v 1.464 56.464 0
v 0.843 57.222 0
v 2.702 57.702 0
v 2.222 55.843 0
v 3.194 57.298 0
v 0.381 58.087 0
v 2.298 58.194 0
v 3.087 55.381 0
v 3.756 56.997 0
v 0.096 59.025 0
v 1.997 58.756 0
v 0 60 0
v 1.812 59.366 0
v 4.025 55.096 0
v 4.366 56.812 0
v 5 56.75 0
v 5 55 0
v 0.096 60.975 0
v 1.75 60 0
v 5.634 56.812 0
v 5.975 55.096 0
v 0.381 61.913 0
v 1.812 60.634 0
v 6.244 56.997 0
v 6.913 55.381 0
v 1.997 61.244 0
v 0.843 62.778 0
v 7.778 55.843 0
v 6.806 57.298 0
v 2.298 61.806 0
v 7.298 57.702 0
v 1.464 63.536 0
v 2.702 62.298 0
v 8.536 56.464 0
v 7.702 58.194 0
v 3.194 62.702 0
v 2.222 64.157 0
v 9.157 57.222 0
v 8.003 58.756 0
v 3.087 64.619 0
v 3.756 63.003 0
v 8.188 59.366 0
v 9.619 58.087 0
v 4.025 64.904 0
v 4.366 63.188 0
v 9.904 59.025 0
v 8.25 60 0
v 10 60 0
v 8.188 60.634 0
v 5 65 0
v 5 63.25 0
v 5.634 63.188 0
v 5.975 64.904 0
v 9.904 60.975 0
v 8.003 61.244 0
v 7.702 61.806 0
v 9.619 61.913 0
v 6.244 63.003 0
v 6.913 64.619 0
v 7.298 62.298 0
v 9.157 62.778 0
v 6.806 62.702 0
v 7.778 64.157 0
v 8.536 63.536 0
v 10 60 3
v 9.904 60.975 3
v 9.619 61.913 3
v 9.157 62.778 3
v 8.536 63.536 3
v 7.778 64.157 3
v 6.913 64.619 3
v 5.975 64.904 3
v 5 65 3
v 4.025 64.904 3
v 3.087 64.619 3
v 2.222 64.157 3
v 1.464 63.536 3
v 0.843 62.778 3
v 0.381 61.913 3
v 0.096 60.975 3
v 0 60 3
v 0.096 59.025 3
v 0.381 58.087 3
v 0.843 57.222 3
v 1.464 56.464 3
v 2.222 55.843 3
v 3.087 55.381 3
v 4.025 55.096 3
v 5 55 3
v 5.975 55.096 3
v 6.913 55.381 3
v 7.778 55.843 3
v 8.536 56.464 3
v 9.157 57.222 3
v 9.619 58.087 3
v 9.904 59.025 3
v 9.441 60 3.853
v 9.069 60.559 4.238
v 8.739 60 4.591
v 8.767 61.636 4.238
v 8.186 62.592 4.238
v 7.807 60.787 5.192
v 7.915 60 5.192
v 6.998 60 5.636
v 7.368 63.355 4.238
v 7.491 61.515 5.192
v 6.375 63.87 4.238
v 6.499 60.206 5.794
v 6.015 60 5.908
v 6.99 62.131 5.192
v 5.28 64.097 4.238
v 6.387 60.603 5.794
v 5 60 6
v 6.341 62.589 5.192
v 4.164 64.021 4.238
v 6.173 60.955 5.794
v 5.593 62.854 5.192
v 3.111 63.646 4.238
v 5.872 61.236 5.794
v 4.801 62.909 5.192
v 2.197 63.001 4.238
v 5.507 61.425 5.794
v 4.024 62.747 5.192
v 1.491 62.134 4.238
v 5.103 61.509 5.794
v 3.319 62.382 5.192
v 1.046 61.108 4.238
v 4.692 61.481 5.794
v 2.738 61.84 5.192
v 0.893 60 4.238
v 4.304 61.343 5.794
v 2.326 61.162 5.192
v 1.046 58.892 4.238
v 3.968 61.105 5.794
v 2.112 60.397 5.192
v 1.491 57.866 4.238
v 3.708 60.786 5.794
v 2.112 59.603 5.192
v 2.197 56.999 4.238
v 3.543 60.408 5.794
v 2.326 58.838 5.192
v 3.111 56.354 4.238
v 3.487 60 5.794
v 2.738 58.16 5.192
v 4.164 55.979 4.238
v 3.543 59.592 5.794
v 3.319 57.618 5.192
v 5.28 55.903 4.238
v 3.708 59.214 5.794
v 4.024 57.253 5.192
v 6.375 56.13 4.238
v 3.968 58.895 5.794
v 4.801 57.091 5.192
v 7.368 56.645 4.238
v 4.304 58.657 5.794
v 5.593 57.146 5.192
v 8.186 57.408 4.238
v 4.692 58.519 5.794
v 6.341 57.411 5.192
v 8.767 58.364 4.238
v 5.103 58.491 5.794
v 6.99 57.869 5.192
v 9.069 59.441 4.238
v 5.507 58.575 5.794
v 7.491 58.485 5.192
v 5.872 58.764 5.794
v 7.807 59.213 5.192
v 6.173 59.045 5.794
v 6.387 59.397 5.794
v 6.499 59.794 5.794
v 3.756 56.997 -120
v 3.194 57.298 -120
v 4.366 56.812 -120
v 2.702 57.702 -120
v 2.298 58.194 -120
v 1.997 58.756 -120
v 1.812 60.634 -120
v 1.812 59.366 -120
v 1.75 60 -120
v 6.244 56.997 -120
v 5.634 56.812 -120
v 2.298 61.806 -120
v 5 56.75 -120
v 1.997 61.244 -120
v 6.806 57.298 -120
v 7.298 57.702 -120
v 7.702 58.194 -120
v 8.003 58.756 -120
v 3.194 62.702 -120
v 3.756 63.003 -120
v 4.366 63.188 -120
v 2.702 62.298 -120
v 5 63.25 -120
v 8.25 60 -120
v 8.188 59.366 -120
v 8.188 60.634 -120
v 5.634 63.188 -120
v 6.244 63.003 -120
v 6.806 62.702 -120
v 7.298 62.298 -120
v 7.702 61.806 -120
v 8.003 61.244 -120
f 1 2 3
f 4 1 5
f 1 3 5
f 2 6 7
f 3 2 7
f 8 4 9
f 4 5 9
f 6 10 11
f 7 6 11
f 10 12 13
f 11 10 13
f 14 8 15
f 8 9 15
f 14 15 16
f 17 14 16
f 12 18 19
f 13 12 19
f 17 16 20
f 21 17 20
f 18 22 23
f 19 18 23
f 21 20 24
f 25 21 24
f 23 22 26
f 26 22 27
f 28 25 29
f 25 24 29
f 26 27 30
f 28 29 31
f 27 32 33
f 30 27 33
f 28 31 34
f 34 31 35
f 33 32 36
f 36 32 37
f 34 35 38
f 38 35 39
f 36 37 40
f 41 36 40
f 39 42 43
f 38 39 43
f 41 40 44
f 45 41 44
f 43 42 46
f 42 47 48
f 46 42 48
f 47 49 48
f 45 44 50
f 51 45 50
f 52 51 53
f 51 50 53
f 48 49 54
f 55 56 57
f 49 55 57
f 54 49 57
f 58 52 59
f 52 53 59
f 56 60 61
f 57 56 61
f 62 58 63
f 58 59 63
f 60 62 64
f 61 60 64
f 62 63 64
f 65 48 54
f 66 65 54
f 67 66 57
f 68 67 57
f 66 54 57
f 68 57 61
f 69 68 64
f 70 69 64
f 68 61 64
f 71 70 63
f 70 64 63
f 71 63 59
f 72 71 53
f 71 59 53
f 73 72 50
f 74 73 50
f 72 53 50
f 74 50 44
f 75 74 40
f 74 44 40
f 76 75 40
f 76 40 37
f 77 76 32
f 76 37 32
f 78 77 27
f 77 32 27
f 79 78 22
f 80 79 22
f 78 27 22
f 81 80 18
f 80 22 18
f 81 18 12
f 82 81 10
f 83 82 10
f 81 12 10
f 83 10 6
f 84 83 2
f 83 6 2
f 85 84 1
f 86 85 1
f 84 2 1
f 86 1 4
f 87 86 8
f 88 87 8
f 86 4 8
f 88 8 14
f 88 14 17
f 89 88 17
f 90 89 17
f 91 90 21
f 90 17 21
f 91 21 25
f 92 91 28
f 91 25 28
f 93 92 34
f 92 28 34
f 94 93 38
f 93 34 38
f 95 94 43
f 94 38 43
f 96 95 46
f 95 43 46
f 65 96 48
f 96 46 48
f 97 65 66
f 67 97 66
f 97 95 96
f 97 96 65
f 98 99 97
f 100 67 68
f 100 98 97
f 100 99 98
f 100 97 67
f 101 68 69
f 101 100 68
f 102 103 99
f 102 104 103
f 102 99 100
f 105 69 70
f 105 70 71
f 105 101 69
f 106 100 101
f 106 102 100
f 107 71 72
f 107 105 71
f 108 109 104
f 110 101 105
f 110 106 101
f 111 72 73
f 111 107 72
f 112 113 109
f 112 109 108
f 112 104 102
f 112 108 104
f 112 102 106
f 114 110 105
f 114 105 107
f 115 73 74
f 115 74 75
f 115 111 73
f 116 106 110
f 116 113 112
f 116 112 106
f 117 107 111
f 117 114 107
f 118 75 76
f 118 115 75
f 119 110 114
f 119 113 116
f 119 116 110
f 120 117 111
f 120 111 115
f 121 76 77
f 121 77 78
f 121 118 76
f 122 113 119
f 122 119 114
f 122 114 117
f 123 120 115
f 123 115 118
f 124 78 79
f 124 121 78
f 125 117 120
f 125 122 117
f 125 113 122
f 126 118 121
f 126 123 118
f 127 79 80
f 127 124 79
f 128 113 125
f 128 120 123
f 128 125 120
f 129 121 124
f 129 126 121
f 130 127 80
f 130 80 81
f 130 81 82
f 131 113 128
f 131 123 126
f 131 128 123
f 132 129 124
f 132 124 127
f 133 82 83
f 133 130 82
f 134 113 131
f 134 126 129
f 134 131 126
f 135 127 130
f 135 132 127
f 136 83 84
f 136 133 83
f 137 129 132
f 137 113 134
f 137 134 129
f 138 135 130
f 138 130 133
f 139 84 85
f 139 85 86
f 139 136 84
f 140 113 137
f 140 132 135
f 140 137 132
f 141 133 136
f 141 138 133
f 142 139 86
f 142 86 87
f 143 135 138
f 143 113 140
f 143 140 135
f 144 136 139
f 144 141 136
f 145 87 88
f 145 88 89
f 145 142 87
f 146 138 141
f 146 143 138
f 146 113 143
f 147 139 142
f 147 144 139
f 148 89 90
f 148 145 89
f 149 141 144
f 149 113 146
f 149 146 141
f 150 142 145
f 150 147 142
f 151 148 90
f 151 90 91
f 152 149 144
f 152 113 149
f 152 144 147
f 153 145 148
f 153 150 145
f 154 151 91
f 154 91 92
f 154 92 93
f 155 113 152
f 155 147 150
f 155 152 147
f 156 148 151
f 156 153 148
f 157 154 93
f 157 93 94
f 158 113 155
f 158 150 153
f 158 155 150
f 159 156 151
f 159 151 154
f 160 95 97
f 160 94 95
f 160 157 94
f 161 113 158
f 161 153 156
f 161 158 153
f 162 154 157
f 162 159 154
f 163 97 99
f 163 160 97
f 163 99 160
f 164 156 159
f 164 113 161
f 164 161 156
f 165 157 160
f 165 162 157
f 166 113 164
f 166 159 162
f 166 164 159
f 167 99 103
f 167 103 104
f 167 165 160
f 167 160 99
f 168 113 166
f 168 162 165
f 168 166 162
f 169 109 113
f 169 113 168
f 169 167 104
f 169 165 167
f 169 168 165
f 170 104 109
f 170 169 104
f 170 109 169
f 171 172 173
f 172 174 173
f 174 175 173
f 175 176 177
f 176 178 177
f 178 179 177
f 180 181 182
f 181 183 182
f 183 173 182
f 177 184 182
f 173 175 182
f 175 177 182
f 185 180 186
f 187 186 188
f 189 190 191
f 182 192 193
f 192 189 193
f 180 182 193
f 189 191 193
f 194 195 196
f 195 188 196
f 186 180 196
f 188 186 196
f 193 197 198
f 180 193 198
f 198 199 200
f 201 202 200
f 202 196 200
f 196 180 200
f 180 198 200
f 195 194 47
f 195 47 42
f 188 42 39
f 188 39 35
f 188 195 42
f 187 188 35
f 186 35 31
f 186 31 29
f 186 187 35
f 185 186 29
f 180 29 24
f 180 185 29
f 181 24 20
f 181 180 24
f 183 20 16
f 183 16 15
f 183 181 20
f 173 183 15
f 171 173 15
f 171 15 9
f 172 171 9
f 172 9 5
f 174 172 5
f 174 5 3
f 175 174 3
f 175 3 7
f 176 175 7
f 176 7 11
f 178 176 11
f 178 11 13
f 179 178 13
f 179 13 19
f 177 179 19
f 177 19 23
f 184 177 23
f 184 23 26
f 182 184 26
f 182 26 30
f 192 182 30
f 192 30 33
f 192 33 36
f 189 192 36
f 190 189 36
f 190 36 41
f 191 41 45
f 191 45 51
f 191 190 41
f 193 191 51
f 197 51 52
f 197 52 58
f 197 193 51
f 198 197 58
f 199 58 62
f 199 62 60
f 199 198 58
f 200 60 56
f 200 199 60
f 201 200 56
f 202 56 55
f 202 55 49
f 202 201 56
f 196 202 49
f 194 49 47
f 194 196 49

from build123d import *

# Parameters (mm, degrees)
SKETCH1_R           = 3.25
SKETCH3_R           = 5
BOSS_EXTRUDE1_DEPTH = 3
DOME1_FACE_RADIUS   = 5
DOME1_HEIGHT        = 3


with BuildPart() as part:
    # Sweep1: sweep along a path in Sketch2
    with BuildLine(Plane(origin=(5, 0, 0), x_dir=(0, 0, -1), z_dir=(1, 0, 0))) as sweep1_path:
        Line((0, 0), (120, 0))
    # Sketch1 → Sweep1 (sweep)
    with BuildSketch(Plane.XY):
        with Locations((5, 60)):
            Circle(SKETCH1_R)
    sweep(path=sweep1_path.line)

    # Sketch3 → Boss-Extrude1 (add)
    with BuildSketch(Plane.XY):
        with Locations((5, 60)):
            Circle(SKETCH3_R)
    extrude(amount=BOSS_EXTRUDE1_DEPTH)

    # Dome1: a dome of height H over a round flat face of radius A is a cap of a sphere of radius (A * A + H * H) / (2 * H)
    dome1_r = (DOME1_FACE_RADIUS * DOME1_FACE_RADIUS + DOME1_HEIGHT * DOME1_HEIGHT) / (2 * DOME1_HEIGHT)
    dome1_base = Plane((5, 60, 3), z_dir=(0, 0, 1))
    with Locations(dome1_base.offset(DOME1_HEIGHT - dome1_r)):
        dome1_ball = Sphere(dome1_r, mode=Mode.PRIVATE)
    add(split(dome1_ball, bisect_by=dome1_base, keep=Keep.TOP, mode=Mode.PRIVATE))


solid = part.part
